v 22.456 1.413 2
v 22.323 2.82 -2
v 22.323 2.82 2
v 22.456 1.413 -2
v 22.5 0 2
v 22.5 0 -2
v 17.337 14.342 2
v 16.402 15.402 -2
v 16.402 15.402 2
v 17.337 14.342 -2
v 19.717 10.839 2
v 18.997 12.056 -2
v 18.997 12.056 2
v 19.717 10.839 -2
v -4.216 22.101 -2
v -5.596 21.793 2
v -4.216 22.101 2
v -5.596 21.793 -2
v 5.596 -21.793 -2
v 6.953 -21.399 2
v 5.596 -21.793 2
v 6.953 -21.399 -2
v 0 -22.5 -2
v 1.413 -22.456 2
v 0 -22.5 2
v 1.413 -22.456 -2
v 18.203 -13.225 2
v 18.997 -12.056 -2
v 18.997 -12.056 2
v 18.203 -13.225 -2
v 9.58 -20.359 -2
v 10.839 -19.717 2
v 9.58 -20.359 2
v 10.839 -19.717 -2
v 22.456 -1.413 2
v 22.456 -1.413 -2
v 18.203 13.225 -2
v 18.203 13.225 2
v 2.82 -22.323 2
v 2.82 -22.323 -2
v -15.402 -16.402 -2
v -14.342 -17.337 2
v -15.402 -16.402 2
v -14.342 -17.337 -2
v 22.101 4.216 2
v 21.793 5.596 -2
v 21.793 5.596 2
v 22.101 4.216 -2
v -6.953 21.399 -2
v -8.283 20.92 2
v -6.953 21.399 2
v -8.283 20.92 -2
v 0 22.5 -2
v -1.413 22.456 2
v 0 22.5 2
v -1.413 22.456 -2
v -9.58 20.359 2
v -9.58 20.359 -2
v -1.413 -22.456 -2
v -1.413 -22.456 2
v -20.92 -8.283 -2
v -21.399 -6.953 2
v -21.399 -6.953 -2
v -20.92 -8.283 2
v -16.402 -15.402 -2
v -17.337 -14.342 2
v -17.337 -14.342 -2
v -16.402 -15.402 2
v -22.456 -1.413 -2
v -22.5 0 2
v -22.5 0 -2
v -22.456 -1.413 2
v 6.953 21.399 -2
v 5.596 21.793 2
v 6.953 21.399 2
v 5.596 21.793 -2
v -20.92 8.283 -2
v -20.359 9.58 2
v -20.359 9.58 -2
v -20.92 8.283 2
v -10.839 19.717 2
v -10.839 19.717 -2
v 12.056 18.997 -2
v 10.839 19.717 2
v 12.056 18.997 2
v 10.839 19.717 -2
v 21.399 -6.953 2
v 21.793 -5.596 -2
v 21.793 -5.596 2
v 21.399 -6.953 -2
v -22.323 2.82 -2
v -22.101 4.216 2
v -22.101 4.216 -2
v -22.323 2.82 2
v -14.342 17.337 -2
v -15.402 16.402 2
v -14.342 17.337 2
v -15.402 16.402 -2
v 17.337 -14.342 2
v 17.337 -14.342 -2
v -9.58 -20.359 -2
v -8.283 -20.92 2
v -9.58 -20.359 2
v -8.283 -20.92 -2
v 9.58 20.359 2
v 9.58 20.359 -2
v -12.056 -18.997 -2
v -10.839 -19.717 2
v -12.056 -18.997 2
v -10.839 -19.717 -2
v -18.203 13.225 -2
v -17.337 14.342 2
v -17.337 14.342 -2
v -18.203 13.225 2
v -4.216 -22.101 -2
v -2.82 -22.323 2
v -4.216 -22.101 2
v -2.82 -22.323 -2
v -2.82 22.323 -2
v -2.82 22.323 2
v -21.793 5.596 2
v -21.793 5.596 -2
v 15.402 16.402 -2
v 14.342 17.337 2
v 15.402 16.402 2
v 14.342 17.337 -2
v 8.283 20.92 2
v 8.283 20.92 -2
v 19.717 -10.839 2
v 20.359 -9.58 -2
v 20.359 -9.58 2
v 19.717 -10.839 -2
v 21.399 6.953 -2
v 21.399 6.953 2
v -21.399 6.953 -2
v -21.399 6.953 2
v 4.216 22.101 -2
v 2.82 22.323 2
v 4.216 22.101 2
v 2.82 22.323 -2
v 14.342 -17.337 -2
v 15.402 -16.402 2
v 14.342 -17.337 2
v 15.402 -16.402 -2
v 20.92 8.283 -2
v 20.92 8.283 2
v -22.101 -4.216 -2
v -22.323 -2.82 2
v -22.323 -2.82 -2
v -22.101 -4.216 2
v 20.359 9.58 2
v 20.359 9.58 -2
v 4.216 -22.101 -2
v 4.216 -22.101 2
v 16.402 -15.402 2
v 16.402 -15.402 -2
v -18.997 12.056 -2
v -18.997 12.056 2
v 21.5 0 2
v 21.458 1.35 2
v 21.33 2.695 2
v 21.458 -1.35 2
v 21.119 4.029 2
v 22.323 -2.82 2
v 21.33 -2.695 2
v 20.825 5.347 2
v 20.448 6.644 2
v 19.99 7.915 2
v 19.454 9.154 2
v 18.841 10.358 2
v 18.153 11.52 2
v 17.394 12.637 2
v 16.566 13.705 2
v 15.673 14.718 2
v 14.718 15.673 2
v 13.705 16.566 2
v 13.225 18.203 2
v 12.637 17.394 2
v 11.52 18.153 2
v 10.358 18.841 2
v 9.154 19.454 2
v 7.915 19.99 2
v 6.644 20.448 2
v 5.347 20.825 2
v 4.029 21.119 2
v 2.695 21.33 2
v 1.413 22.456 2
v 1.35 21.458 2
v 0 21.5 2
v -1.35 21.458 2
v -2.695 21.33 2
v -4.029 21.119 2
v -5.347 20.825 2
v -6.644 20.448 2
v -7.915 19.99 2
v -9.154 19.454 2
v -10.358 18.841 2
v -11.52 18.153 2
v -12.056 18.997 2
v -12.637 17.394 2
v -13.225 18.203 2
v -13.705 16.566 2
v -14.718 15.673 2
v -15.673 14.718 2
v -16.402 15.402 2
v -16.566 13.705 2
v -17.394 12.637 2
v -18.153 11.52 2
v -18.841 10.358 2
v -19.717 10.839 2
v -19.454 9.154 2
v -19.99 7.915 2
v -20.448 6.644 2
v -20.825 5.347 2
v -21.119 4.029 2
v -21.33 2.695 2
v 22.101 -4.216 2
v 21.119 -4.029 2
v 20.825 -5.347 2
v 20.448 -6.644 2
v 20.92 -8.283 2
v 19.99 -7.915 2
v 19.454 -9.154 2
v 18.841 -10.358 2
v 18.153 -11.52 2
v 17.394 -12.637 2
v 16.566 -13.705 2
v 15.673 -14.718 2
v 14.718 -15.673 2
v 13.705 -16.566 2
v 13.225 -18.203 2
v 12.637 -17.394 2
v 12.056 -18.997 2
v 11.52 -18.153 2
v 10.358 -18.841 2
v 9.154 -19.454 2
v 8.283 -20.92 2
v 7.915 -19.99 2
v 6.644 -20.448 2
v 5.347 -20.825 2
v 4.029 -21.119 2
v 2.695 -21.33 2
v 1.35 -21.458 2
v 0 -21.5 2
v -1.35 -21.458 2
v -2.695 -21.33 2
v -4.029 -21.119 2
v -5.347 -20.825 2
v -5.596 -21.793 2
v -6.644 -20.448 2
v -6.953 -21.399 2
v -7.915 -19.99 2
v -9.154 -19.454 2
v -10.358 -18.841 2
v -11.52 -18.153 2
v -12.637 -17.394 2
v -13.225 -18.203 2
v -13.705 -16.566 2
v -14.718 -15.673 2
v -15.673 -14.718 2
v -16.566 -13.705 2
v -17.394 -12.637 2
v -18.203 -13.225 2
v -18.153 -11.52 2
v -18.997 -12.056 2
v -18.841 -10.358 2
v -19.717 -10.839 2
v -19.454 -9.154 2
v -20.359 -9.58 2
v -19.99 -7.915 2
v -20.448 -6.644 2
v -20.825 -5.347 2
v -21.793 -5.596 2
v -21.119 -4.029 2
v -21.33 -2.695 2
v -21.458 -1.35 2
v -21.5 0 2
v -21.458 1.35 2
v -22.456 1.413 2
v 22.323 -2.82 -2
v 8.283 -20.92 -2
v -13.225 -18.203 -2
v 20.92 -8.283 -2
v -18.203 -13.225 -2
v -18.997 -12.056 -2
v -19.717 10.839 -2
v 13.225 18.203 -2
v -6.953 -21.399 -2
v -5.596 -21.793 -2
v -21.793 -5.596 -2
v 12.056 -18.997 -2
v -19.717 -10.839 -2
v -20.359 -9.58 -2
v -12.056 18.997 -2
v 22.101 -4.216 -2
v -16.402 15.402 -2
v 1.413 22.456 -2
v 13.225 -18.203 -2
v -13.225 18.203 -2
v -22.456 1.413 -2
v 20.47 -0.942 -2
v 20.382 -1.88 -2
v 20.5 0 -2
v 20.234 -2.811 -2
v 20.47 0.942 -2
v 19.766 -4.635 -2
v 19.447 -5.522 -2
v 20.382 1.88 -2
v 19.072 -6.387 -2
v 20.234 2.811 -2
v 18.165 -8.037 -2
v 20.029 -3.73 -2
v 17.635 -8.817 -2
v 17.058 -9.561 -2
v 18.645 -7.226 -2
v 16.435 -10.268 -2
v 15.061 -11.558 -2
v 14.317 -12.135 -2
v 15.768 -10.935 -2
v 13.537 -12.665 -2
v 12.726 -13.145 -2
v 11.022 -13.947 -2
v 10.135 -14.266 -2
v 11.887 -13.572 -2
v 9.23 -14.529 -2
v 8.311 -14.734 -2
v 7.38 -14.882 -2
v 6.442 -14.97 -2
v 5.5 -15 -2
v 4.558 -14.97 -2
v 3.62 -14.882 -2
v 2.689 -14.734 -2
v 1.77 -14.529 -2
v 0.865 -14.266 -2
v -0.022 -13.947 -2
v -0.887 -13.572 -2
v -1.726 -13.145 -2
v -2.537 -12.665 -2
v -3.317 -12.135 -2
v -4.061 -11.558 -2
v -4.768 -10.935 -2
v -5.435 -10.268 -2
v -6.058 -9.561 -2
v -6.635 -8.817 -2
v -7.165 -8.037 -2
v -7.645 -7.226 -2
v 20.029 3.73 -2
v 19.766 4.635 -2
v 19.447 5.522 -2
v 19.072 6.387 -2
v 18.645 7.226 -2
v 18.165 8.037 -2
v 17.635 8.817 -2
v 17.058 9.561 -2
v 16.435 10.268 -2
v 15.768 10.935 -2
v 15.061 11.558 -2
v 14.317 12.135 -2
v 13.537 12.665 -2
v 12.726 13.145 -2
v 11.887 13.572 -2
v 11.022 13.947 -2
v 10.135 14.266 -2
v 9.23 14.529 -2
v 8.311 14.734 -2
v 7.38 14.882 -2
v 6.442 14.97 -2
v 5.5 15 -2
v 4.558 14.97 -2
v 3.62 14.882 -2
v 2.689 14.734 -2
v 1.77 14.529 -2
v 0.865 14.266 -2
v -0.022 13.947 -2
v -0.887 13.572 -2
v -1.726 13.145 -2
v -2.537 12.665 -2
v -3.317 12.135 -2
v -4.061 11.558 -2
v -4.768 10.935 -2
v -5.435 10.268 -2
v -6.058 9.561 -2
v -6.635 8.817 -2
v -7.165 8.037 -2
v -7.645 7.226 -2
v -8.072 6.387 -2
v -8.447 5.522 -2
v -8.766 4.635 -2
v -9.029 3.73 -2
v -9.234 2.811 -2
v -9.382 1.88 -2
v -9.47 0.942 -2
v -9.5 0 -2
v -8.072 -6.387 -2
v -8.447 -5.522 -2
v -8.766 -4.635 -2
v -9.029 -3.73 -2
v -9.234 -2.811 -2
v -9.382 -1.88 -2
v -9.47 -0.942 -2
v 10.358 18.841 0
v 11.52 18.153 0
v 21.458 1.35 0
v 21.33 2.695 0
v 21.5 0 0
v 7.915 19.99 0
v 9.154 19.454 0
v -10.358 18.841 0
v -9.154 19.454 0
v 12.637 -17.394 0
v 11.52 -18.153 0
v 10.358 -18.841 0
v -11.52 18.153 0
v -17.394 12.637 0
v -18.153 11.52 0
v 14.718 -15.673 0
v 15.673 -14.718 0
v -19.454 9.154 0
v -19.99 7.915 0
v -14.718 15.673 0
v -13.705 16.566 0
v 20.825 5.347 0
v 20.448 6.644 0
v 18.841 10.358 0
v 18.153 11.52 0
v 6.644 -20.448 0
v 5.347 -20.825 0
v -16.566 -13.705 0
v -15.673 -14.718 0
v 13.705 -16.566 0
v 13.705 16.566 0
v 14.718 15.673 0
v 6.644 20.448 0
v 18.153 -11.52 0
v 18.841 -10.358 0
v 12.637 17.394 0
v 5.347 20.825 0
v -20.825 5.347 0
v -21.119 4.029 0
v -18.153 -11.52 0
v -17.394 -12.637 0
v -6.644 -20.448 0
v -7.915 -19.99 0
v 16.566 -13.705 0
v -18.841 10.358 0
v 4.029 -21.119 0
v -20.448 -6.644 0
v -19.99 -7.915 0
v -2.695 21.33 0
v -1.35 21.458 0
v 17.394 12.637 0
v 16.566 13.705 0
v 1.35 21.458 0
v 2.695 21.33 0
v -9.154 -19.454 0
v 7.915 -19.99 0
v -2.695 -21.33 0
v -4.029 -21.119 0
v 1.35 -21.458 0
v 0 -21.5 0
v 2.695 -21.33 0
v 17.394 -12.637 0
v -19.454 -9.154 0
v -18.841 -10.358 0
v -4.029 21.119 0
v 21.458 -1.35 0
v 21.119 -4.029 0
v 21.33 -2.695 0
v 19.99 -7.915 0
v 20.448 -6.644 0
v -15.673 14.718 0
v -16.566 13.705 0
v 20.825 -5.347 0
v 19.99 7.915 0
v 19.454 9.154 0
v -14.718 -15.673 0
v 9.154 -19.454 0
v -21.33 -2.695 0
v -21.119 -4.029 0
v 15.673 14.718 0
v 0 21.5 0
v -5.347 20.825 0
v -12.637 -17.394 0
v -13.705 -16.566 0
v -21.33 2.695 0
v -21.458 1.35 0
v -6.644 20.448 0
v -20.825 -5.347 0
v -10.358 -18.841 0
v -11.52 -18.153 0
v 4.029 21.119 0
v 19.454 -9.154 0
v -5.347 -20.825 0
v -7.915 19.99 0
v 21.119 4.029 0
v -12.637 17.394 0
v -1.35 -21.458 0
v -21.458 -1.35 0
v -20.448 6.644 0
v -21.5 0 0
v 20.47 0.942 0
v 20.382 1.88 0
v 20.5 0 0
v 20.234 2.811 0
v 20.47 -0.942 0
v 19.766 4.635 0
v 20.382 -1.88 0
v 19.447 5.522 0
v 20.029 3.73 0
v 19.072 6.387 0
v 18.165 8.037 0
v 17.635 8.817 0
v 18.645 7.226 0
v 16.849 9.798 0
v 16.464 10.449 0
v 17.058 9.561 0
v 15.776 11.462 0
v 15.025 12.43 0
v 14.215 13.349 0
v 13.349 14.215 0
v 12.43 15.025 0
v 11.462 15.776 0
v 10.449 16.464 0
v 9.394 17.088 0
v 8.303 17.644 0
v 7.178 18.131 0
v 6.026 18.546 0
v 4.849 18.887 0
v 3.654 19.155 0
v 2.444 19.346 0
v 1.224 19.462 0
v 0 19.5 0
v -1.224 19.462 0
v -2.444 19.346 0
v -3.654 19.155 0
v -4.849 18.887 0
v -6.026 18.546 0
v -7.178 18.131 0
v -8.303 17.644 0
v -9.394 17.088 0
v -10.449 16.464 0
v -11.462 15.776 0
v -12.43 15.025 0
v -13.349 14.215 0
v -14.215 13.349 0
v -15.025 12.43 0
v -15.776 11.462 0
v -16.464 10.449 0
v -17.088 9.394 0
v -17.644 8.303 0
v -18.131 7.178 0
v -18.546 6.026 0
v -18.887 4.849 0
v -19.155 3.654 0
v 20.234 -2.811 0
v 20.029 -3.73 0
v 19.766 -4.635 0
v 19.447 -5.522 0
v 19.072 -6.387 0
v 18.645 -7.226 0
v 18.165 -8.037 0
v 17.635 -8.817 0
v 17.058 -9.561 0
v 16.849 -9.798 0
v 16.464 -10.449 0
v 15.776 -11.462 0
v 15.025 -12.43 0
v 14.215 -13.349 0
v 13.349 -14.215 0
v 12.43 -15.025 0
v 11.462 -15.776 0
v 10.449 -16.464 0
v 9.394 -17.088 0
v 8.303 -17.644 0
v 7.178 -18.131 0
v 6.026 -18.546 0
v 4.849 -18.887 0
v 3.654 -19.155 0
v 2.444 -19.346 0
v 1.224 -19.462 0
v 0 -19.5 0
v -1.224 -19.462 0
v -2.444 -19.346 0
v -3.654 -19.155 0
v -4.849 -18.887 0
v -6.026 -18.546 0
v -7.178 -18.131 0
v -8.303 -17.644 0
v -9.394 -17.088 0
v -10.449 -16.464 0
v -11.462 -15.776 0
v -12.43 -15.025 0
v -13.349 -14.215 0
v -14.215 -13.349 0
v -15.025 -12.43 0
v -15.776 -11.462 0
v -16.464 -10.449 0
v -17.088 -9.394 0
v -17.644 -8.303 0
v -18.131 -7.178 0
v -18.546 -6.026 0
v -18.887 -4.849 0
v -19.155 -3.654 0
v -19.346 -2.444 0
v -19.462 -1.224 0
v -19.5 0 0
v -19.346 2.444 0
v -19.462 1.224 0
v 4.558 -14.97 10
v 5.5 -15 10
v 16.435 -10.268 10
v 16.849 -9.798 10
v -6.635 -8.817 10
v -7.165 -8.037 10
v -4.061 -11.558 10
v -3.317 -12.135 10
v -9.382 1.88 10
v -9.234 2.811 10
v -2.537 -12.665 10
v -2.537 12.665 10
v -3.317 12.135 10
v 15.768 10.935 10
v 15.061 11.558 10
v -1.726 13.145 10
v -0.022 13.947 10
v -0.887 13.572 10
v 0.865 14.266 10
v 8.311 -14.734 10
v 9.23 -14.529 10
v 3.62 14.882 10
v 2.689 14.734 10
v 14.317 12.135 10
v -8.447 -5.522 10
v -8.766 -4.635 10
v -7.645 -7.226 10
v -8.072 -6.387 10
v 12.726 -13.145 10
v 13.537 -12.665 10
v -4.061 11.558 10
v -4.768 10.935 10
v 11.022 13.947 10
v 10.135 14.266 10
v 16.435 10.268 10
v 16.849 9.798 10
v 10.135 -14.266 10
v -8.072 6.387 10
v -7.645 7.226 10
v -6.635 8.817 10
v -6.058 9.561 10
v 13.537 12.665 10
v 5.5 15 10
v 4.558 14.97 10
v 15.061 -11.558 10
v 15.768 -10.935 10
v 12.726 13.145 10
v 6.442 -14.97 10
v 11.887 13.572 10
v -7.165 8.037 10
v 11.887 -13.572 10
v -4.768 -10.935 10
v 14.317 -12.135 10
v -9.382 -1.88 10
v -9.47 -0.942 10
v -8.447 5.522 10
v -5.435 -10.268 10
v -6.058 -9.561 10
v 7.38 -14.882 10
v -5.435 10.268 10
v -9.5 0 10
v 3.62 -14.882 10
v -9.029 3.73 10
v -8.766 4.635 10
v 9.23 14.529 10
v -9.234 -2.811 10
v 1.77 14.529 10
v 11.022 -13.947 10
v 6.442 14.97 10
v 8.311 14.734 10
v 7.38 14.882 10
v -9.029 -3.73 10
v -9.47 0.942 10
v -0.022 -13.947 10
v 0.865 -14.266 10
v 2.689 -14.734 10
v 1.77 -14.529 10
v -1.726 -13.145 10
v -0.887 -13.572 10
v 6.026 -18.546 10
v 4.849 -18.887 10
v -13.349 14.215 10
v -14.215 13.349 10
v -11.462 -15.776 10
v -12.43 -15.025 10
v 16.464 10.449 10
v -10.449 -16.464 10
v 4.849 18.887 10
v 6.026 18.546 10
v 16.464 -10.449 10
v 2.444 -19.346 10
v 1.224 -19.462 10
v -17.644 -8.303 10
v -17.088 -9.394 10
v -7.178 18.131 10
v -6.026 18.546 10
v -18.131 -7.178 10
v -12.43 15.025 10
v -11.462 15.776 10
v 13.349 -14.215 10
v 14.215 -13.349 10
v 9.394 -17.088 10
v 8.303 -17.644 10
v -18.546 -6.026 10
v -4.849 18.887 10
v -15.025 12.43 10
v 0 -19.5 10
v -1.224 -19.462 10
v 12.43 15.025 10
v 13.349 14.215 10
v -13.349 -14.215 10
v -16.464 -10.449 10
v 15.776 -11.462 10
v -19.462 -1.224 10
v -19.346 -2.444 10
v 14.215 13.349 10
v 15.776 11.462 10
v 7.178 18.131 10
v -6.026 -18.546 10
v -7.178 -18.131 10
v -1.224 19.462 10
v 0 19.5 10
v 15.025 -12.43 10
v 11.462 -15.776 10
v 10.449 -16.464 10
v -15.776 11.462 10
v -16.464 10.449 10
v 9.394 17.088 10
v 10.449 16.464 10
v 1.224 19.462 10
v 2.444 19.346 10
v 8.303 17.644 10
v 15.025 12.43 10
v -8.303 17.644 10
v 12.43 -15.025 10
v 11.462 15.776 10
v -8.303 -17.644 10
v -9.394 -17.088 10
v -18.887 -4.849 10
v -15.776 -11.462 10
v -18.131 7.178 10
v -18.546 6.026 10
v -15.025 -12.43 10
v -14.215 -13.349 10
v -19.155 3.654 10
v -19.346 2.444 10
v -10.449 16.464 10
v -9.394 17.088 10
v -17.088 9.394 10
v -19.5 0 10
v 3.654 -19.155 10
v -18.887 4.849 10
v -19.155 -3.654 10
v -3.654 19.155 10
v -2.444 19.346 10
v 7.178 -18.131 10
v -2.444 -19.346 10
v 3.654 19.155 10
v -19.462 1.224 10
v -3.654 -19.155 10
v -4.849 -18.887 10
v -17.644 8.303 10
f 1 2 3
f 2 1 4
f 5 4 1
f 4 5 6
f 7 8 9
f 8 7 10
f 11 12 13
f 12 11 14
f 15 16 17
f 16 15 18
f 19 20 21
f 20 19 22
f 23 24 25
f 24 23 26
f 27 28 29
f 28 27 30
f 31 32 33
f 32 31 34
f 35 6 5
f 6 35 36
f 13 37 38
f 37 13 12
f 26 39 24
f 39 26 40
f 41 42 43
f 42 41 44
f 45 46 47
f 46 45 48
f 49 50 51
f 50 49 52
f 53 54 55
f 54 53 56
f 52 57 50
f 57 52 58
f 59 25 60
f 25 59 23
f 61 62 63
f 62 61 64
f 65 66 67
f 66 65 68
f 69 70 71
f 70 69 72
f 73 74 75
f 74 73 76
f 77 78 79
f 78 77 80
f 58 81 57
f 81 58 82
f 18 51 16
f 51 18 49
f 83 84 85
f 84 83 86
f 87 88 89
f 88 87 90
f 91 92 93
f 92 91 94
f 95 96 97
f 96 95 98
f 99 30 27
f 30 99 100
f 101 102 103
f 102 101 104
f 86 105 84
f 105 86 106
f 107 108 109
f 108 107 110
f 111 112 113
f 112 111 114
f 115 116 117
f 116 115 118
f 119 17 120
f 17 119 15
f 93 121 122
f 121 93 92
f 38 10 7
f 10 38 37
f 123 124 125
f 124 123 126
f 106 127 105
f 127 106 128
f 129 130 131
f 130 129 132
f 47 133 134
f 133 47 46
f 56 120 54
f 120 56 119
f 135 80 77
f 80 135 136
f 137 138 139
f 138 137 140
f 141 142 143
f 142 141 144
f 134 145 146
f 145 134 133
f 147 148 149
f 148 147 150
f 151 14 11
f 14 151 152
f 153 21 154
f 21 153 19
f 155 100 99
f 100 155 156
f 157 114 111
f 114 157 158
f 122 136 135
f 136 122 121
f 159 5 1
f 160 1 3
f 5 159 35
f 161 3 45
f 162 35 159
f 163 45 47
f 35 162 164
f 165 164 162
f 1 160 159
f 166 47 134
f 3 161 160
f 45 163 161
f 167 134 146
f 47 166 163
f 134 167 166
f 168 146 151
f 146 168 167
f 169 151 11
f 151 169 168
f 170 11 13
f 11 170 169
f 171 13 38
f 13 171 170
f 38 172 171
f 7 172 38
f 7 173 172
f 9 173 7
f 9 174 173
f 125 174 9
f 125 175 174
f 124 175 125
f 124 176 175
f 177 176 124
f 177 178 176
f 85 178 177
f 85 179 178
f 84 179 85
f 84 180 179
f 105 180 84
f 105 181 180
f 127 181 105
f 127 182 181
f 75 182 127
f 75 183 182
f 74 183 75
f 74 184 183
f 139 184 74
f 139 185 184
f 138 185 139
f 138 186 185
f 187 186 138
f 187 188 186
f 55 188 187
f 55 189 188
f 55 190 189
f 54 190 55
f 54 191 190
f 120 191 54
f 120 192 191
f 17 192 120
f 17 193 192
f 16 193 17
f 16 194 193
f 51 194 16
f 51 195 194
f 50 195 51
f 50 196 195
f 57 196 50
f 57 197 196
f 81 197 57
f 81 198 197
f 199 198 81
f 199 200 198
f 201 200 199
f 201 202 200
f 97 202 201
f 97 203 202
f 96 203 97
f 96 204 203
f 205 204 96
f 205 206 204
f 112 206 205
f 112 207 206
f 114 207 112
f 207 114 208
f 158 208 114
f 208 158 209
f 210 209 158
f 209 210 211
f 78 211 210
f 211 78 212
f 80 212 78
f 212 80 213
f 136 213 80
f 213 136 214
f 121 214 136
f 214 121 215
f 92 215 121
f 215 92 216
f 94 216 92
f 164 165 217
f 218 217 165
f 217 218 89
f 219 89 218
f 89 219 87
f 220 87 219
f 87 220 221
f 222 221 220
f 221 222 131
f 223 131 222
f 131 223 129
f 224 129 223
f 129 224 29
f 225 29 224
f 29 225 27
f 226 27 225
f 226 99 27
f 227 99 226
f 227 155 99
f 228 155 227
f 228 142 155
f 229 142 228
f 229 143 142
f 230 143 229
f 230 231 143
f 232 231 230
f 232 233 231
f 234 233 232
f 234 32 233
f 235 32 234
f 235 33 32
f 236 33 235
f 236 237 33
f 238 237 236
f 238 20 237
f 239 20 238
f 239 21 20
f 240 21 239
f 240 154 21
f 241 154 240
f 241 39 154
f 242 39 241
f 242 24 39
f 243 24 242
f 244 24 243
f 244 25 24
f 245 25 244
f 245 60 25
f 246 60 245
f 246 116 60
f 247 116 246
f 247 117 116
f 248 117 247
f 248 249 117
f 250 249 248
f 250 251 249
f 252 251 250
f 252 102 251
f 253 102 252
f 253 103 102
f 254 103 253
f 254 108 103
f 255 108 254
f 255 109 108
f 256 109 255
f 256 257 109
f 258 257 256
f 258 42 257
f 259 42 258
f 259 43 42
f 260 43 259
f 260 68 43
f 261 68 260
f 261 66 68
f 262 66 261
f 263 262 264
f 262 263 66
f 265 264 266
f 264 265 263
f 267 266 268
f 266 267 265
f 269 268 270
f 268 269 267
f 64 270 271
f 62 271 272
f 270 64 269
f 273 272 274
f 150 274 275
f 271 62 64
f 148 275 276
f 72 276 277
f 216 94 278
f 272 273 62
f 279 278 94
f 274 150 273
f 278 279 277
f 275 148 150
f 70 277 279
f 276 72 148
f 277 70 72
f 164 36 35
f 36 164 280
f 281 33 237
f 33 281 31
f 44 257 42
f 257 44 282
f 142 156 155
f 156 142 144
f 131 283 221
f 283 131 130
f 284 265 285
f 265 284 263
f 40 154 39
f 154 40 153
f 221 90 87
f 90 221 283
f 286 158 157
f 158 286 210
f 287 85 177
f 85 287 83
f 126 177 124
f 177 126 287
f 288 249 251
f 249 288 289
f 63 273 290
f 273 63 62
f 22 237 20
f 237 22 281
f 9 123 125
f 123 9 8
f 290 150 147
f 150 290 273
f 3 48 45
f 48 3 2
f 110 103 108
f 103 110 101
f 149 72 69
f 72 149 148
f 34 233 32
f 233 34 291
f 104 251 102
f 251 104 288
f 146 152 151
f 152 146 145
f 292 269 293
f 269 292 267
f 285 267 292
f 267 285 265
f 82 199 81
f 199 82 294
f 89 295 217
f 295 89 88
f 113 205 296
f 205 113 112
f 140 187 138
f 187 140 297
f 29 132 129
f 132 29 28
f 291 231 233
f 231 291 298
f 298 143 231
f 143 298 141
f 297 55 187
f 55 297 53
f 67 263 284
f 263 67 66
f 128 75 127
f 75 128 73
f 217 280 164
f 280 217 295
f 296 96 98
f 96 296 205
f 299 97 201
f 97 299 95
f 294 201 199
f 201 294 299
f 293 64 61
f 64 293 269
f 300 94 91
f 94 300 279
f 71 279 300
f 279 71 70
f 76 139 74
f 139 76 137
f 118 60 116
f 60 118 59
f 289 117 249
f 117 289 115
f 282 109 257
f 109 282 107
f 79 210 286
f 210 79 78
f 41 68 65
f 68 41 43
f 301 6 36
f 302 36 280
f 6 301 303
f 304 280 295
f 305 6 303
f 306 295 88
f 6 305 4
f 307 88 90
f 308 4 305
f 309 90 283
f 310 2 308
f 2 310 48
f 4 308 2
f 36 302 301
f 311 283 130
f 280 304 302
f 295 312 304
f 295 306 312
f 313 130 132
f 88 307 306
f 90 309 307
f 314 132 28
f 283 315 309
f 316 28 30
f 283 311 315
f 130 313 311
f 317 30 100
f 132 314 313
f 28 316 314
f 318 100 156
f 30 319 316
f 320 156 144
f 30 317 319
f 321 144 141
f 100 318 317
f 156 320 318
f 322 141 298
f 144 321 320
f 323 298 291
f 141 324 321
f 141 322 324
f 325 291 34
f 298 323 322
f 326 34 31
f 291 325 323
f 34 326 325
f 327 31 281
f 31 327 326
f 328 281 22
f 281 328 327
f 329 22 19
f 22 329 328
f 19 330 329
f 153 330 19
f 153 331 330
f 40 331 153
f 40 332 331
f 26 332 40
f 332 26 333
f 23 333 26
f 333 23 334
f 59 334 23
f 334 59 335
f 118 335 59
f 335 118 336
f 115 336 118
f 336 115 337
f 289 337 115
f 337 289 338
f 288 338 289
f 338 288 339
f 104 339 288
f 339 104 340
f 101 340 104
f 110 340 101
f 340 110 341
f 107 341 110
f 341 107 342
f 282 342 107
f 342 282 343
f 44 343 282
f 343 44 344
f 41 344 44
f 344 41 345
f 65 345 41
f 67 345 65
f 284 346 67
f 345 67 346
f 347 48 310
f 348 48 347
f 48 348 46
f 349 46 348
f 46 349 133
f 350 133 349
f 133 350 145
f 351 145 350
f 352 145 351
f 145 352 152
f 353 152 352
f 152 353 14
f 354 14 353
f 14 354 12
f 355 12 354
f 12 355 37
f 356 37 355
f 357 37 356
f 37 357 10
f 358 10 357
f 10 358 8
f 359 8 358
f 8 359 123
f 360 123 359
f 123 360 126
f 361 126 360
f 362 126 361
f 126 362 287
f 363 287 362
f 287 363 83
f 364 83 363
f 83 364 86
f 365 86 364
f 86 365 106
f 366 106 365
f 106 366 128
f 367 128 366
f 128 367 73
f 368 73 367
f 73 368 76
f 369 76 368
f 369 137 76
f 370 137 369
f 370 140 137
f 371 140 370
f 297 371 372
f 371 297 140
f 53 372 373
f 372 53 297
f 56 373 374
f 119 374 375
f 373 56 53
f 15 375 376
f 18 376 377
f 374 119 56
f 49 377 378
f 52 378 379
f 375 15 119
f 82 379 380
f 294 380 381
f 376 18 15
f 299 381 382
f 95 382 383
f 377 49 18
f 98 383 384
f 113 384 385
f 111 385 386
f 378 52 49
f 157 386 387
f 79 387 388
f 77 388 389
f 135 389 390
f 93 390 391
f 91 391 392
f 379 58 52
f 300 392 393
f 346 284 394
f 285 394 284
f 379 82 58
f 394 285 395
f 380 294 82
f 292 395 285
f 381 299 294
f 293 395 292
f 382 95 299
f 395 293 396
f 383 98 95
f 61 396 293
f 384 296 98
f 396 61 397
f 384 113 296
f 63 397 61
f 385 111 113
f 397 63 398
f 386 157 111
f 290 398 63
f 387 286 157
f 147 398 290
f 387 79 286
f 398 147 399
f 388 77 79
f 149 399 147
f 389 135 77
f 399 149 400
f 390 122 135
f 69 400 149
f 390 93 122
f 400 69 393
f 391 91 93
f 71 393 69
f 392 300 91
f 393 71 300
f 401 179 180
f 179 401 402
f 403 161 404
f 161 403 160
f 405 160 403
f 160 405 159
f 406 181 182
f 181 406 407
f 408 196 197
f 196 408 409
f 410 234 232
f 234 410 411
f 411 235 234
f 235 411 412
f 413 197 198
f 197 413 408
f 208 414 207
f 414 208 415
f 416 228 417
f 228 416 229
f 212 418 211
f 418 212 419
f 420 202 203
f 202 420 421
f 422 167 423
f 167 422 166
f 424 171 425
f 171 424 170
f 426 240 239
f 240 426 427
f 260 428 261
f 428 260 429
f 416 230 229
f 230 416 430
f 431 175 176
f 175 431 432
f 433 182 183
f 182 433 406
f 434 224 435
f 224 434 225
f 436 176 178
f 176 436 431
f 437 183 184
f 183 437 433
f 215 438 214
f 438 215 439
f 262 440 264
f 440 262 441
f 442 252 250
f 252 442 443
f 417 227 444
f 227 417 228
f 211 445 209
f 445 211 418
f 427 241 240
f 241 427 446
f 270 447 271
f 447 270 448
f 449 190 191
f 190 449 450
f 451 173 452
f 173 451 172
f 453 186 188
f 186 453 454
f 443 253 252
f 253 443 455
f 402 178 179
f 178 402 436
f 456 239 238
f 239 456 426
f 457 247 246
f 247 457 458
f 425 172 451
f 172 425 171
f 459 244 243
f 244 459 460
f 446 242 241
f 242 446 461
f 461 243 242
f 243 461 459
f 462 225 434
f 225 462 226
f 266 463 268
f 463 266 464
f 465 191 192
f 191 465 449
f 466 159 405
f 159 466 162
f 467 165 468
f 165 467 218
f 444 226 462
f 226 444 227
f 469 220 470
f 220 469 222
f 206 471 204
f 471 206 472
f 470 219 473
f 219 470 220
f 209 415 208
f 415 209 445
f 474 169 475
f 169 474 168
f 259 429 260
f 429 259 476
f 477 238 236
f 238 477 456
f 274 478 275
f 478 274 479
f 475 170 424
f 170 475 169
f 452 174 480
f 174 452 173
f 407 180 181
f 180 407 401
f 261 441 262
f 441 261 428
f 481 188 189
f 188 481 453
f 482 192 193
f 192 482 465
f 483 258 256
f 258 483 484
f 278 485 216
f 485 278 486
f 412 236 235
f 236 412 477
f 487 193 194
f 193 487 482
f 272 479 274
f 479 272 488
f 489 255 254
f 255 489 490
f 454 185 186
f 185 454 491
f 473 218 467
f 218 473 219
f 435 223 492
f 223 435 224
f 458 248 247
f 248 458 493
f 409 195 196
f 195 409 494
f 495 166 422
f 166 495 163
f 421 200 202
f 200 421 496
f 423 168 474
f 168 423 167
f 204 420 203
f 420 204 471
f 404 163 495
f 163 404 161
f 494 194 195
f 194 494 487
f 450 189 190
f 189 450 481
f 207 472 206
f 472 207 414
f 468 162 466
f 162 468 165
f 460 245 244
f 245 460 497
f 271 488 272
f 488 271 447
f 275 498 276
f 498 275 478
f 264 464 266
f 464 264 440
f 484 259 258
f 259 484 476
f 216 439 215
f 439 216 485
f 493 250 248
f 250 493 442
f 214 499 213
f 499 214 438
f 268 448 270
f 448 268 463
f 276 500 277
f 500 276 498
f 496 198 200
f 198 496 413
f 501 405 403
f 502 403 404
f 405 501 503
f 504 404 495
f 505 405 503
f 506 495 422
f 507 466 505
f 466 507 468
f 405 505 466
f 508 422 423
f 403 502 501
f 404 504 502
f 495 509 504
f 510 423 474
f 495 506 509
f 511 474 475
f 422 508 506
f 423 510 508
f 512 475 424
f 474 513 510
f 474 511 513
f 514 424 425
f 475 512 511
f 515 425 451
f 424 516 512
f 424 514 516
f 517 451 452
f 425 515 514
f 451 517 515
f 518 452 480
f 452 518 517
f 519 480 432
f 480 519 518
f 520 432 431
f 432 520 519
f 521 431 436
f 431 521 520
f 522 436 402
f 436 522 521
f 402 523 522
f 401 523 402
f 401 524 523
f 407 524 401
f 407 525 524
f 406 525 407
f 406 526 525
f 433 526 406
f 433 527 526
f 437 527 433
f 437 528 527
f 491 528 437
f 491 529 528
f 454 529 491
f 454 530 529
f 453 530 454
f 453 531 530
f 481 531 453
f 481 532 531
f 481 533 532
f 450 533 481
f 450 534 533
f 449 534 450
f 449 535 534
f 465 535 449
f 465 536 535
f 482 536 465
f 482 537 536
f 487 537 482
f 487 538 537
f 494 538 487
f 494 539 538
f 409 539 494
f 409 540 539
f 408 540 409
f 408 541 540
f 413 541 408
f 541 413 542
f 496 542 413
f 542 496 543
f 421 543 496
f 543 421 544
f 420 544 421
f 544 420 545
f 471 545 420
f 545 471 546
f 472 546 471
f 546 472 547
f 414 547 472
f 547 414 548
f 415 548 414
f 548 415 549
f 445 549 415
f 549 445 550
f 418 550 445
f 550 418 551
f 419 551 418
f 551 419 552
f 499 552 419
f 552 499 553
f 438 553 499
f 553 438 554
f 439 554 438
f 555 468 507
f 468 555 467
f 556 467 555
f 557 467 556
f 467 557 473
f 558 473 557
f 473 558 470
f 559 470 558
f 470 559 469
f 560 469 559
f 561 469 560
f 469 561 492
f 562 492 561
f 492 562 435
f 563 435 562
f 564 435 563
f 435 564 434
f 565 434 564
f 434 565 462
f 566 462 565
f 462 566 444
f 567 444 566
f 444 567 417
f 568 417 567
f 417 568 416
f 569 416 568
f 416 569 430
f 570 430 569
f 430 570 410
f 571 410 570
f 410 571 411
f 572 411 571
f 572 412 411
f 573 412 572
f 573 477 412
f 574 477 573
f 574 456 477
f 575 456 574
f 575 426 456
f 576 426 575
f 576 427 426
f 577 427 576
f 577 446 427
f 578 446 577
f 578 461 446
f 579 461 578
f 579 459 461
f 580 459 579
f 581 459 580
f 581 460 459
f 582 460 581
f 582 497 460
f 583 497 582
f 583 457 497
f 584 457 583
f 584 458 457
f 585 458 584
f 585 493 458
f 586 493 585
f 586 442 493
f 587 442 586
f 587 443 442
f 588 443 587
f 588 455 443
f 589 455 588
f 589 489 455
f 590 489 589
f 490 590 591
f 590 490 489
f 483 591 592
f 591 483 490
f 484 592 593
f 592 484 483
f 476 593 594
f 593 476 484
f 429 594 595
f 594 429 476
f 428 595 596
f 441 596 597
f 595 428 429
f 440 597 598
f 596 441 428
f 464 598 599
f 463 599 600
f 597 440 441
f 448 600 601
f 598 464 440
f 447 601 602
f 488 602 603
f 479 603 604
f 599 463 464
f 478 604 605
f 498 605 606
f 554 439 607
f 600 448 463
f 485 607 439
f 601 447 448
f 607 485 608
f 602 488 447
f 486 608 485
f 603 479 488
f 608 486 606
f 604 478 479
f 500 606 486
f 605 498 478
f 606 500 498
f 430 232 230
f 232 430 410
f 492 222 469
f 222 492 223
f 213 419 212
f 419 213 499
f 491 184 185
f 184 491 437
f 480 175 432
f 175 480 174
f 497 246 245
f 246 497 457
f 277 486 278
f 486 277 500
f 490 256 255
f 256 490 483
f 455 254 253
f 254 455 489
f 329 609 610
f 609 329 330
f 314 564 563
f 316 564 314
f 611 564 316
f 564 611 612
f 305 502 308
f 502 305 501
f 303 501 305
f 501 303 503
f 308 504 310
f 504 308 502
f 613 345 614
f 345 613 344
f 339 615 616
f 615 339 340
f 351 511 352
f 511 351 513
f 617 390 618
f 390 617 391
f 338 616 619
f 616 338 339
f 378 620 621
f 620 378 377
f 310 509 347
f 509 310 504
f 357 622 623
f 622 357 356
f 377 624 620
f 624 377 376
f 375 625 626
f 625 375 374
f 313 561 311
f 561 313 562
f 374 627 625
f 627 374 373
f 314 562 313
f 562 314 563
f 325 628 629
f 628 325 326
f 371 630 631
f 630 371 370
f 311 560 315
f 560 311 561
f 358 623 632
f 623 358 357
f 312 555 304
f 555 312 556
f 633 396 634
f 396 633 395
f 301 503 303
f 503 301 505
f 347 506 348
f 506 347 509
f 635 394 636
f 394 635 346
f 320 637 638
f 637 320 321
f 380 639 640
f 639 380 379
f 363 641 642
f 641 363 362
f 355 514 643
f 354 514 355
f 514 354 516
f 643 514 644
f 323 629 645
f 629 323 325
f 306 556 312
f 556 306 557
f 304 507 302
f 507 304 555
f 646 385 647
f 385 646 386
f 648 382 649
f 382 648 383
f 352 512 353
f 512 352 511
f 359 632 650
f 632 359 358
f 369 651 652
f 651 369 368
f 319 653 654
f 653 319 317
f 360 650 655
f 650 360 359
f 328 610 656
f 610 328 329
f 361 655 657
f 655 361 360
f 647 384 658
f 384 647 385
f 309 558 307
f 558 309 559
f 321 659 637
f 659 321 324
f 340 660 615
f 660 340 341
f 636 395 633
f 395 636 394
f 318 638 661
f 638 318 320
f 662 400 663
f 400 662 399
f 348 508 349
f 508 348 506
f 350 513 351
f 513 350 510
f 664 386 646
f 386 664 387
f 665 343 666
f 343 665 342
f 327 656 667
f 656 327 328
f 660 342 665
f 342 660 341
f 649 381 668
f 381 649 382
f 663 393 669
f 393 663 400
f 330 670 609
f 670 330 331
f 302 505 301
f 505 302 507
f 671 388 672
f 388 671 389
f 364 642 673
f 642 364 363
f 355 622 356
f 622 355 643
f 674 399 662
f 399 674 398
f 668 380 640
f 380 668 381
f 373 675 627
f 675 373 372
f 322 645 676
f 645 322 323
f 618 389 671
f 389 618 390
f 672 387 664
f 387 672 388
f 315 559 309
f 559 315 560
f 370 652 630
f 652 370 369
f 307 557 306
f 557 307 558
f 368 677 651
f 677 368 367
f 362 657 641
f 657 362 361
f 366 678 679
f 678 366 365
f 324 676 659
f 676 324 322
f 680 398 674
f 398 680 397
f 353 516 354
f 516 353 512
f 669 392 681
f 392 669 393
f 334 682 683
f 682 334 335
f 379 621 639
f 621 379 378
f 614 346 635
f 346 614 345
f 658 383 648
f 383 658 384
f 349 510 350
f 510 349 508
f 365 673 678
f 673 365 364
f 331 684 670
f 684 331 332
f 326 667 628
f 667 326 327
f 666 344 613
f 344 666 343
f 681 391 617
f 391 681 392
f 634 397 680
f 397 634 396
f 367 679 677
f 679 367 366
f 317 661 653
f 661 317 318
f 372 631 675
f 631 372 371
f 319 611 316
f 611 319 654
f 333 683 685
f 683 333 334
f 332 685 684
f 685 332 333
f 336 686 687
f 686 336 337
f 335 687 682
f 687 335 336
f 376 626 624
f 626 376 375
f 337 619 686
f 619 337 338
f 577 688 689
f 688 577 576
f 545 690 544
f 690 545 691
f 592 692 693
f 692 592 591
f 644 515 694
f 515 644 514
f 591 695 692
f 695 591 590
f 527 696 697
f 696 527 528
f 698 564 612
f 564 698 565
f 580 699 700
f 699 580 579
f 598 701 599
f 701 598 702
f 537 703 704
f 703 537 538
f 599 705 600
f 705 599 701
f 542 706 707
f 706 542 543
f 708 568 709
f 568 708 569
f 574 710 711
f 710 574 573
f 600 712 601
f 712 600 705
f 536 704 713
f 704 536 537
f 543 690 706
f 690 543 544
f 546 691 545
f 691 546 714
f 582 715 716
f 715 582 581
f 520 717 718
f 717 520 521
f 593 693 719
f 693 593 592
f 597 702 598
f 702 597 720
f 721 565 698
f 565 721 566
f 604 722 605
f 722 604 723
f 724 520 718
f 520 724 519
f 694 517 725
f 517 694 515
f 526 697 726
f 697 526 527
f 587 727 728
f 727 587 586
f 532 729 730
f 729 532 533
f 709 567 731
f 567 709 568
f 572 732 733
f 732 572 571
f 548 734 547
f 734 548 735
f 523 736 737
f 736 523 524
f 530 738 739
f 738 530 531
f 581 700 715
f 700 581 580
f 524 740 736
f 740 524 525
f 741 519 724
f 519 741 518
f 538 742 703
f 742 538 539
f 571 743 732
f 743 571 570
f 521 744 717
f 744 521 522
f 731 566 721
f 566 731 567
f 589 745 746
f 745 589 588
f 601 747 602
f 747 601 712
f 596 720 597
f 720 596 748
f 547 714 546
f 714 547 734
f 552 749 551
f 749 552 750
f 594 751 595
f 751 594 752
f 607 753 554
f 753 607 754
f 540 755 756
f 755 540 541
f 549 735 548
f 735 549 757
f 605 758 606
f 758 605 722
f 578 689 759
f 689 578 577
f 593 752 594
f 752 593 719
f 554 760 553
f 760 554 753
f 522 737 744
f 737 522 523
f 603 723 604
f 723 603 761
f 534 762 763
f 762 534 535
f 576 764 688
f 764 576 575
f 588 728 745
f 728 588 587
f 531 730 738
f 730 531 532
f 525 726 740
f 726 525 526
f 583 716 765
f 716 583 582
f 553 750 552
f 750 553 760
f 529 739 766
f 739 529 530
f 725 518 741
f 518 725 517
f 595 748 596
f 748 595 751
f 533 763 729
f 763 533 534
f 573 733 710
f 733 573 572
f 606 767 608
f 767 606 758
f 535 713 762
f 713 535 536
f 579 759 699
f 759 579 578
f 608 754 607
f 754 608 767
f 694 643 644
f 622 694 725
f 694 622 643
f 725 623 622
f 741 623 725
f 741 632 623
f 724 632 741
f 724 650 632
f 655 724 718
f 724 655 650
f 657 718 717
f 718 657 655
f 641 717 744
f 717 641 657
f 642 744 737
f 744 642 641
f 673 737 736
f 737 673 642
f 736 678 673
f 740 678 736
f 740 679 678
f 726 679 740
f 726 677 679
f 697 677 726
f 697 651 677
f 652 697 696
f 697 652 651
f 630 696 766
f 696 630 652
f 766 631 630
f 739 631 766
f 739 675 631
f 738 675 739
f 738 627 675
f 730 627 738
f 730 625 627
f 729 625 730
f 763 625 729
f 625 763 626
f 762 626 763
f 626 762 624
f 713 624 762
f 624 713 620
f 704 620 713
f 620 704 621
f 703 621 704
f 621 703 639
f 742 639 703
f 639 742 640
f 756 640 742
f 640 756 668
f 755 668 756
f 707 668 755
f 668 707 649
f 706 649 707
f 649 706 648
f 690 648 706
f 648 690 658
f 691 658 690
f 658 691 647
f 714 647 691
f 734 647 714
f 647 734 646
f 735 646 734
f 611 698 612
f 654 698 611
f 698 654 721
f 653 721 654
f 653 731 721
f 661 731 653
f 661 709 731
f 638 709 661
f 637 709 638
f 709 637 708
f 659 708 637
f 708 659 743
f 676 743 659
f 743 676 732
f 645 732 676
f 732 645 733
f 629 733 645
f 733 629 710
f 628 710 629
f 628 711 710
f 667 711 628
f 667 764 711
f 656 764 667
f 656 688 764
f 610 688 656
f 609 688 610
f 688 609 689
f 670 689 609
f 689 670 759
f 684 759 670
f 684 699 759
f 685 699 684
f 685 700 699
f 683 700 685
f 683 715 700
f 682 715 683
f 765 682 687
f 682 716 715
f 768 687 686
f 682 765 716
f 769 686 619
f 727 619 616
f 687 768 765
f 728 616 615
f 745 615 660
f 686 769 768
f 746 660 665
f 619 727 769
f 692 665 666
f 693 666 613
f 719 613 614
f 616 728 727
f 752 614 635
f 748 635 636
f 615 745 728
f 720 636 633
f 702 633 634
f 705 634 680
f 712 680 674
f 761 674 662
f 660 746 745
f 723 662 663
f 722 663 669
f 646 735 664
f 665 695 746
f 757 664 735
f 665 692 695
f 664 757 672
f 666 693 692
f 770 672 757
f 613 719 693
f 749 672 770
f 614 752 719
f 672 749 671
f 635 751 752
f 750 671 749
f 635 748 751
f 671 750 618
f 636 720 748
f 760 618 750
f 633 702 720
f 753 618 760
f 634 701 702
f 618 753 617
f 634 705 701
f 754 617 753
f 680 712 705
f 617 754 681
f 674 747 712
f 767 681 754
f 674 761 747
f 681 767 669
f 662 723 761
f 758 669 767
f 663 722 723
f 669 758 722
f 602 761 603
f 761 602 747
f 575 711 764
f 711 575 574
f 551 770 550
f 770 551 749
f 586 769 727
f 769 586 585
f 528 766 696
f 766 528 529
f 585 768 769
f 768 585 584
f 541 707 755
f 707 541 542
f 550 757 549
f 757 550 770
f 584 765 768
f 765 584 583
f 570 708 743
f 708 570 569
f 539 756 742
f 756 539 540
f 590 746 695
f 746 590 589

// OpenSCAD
// file: lib.scad
module middle(tube_diameter, adapter_length, adapter_thickness, ring_length, ring_thickness, resolution) {
    difference() {
        cylinder(d = tube_diameter, h = adapter_length, center = false, $fn = resolution);
        cylinder(d = tube_diameter - adapter_thickness, h = adapter_length, center = false, $fn = resolution);
    }

    difference() {
        cylinder(d = tube_diameter + ring_thickness, h = ring_length, center = false, $fn = resolution);
        cylinder(d = tube_diameter - adapter_thickness, h = ring_length, center = false, $fn = resolution);
    }
}

module front(tube_diameter, tube_thickness, ring_thickness, ring_length, front_plate_thickness, inner_length, bottle_diameter, bottle_offset, resolution) {
    difference() {
        cylinder(d = tube_diameter + ring_thickness, h = ring_length + front_plate_thickness, center = true, $fn = resolution);
        translate([0,0,front_plate_thickness/2]) 
            cylinder(d = tube_diameter, h = ring_length, center = true, $fn = resolution);
        translate([bottle_offset/2,0,-front_plate_thickness/2]) 
            cylinder(d = bottle_diameter, h = front_plate_thickness, center = true, $fn = resolution);
    }

    translate([0,0,(ring_length-front_plate_thickness)/2]) difference() {
        translate([0,0,inner_length/2]) 
            cylinder(d = tube_diameter - tube_thickness - 2, h = inner_length, center = true, $fn = resolution);
        translate([bottle_offset/2,0,inner_length/2]) 
            cylinder(d = bottle_diameter, h = inner_length, center = true, $fn = resolution);
    }
}

module rear(tube_diameter, tube_thickness, ring_thickness, inner_ring_thickness, ring_length, inner_ring_length, front_plate_thickness, chip_length, chip_platform_offset, chip_platform_thickness, usb_hole, resolution) {
    // ring and usb hole
    difference() {
        cylinder(d = tube_diameter + ring_thickness, h = ring_length + front_plate_thickness, center = true, $fn = resolution);
        
        translate([0,0,front_plate_thickness/2]) 
            cylinder(d = tube_diameter, h = ring_length, center = true, $fn = resolution);
        
        // usb hole
        translate([usb_hole/2,usb_hole/2,-front_plate_thickness/2]) 
            cylinder(d = usb_hole, h = front_plate_thickness, center = true, $fn = resolution);
        translate([usb_hole/2,-usb_hole/2,-front_plate_thickness/2]) 
            cylinder(d = usb_hole, h = front_plate_thickness, center = true, $fn = resolution);
        translate([usb_hole/2,0,-front_plate_thickness/2]) 
            cube(usb_hole, center = true);
    }

    // inner ring and chip platform
    difference() {
        inner_ring_remover_size = (chip_length < (tube_diameter - tube_thickness)) ? tube_diameter - tube_thickness : chip_length;
        inner_ring_remover_offset =  (usb_hole < chip_platform_offset) ? usb_hole : chip_platform_offset;

        // inner ring
        translate([0,0,chip_length/2]) 
            cylinder(d = tube_diameter - tube_thickness, h = chip_length, center = true, $fn = resolution);
        difference() {
            translate([0,0,chip_length/2]) 
                cylinder(d = tube_diameter - tube_thickness - inner_ring_thickness, h = chip_length, center = true, $fn = resolution);

            // chip platform
            translate([(tube_diameter - tube_thickness)/2 + chip_platform_offset,0,inner_ring_remover_size/2]) 
                cube(inner_ring_remover_size, center = true); 
        }
        
        // chip platform ring
        translate([0,0,chip_length/2]) 
            cylinder(d = tube_diameter - tube_thickness - inner_ring_thickness - chip_platform_thickness, h = chip_length, center = true, $fn = resolution);

        // upper inner ring thickness
        translate([-inner_ring_remover_size/2 + inner_ring_remover_offset/2,0,inner_ring_remover_size/2 + inner_ring_length])
            cube(inner_ring_remover_size, center = true);

        // inner ring recess
        translate([-inner_ring_remover_offset/2 + inner_ring_remover_offset/2,(inner_ring_remover_size - inner_ring_thickness)/2,inner_ring_remover_offset/2+1]) 
            cube(inner_ring_remover_offset, center = true);
        translate([-inner_ring_remover_offset/2 + inner_ring_remover_offset/2,-(inner_ring_remover_size - inner_ring_thickness)/2,inner_ring_remover_offset/2+1]) 
            cube(inner_ring_remover_offset, center = true);
    }
}
// main file
tube_diameter = 43;
tube_thickness = 2;
bottle_diameter = 30;
bottle_offset = 11;

ring_thickness = 2;
ring_length = 2;
front_plate_thickness = 2;
inner_length = 10;
resolution = 100;

use <lib.scad>;

front(tube_diameter, tube_thickness, ring_thickness, ring_length, front_plate_thickness, inner_length, bottle_diameter, bottle_offset, resolution);
